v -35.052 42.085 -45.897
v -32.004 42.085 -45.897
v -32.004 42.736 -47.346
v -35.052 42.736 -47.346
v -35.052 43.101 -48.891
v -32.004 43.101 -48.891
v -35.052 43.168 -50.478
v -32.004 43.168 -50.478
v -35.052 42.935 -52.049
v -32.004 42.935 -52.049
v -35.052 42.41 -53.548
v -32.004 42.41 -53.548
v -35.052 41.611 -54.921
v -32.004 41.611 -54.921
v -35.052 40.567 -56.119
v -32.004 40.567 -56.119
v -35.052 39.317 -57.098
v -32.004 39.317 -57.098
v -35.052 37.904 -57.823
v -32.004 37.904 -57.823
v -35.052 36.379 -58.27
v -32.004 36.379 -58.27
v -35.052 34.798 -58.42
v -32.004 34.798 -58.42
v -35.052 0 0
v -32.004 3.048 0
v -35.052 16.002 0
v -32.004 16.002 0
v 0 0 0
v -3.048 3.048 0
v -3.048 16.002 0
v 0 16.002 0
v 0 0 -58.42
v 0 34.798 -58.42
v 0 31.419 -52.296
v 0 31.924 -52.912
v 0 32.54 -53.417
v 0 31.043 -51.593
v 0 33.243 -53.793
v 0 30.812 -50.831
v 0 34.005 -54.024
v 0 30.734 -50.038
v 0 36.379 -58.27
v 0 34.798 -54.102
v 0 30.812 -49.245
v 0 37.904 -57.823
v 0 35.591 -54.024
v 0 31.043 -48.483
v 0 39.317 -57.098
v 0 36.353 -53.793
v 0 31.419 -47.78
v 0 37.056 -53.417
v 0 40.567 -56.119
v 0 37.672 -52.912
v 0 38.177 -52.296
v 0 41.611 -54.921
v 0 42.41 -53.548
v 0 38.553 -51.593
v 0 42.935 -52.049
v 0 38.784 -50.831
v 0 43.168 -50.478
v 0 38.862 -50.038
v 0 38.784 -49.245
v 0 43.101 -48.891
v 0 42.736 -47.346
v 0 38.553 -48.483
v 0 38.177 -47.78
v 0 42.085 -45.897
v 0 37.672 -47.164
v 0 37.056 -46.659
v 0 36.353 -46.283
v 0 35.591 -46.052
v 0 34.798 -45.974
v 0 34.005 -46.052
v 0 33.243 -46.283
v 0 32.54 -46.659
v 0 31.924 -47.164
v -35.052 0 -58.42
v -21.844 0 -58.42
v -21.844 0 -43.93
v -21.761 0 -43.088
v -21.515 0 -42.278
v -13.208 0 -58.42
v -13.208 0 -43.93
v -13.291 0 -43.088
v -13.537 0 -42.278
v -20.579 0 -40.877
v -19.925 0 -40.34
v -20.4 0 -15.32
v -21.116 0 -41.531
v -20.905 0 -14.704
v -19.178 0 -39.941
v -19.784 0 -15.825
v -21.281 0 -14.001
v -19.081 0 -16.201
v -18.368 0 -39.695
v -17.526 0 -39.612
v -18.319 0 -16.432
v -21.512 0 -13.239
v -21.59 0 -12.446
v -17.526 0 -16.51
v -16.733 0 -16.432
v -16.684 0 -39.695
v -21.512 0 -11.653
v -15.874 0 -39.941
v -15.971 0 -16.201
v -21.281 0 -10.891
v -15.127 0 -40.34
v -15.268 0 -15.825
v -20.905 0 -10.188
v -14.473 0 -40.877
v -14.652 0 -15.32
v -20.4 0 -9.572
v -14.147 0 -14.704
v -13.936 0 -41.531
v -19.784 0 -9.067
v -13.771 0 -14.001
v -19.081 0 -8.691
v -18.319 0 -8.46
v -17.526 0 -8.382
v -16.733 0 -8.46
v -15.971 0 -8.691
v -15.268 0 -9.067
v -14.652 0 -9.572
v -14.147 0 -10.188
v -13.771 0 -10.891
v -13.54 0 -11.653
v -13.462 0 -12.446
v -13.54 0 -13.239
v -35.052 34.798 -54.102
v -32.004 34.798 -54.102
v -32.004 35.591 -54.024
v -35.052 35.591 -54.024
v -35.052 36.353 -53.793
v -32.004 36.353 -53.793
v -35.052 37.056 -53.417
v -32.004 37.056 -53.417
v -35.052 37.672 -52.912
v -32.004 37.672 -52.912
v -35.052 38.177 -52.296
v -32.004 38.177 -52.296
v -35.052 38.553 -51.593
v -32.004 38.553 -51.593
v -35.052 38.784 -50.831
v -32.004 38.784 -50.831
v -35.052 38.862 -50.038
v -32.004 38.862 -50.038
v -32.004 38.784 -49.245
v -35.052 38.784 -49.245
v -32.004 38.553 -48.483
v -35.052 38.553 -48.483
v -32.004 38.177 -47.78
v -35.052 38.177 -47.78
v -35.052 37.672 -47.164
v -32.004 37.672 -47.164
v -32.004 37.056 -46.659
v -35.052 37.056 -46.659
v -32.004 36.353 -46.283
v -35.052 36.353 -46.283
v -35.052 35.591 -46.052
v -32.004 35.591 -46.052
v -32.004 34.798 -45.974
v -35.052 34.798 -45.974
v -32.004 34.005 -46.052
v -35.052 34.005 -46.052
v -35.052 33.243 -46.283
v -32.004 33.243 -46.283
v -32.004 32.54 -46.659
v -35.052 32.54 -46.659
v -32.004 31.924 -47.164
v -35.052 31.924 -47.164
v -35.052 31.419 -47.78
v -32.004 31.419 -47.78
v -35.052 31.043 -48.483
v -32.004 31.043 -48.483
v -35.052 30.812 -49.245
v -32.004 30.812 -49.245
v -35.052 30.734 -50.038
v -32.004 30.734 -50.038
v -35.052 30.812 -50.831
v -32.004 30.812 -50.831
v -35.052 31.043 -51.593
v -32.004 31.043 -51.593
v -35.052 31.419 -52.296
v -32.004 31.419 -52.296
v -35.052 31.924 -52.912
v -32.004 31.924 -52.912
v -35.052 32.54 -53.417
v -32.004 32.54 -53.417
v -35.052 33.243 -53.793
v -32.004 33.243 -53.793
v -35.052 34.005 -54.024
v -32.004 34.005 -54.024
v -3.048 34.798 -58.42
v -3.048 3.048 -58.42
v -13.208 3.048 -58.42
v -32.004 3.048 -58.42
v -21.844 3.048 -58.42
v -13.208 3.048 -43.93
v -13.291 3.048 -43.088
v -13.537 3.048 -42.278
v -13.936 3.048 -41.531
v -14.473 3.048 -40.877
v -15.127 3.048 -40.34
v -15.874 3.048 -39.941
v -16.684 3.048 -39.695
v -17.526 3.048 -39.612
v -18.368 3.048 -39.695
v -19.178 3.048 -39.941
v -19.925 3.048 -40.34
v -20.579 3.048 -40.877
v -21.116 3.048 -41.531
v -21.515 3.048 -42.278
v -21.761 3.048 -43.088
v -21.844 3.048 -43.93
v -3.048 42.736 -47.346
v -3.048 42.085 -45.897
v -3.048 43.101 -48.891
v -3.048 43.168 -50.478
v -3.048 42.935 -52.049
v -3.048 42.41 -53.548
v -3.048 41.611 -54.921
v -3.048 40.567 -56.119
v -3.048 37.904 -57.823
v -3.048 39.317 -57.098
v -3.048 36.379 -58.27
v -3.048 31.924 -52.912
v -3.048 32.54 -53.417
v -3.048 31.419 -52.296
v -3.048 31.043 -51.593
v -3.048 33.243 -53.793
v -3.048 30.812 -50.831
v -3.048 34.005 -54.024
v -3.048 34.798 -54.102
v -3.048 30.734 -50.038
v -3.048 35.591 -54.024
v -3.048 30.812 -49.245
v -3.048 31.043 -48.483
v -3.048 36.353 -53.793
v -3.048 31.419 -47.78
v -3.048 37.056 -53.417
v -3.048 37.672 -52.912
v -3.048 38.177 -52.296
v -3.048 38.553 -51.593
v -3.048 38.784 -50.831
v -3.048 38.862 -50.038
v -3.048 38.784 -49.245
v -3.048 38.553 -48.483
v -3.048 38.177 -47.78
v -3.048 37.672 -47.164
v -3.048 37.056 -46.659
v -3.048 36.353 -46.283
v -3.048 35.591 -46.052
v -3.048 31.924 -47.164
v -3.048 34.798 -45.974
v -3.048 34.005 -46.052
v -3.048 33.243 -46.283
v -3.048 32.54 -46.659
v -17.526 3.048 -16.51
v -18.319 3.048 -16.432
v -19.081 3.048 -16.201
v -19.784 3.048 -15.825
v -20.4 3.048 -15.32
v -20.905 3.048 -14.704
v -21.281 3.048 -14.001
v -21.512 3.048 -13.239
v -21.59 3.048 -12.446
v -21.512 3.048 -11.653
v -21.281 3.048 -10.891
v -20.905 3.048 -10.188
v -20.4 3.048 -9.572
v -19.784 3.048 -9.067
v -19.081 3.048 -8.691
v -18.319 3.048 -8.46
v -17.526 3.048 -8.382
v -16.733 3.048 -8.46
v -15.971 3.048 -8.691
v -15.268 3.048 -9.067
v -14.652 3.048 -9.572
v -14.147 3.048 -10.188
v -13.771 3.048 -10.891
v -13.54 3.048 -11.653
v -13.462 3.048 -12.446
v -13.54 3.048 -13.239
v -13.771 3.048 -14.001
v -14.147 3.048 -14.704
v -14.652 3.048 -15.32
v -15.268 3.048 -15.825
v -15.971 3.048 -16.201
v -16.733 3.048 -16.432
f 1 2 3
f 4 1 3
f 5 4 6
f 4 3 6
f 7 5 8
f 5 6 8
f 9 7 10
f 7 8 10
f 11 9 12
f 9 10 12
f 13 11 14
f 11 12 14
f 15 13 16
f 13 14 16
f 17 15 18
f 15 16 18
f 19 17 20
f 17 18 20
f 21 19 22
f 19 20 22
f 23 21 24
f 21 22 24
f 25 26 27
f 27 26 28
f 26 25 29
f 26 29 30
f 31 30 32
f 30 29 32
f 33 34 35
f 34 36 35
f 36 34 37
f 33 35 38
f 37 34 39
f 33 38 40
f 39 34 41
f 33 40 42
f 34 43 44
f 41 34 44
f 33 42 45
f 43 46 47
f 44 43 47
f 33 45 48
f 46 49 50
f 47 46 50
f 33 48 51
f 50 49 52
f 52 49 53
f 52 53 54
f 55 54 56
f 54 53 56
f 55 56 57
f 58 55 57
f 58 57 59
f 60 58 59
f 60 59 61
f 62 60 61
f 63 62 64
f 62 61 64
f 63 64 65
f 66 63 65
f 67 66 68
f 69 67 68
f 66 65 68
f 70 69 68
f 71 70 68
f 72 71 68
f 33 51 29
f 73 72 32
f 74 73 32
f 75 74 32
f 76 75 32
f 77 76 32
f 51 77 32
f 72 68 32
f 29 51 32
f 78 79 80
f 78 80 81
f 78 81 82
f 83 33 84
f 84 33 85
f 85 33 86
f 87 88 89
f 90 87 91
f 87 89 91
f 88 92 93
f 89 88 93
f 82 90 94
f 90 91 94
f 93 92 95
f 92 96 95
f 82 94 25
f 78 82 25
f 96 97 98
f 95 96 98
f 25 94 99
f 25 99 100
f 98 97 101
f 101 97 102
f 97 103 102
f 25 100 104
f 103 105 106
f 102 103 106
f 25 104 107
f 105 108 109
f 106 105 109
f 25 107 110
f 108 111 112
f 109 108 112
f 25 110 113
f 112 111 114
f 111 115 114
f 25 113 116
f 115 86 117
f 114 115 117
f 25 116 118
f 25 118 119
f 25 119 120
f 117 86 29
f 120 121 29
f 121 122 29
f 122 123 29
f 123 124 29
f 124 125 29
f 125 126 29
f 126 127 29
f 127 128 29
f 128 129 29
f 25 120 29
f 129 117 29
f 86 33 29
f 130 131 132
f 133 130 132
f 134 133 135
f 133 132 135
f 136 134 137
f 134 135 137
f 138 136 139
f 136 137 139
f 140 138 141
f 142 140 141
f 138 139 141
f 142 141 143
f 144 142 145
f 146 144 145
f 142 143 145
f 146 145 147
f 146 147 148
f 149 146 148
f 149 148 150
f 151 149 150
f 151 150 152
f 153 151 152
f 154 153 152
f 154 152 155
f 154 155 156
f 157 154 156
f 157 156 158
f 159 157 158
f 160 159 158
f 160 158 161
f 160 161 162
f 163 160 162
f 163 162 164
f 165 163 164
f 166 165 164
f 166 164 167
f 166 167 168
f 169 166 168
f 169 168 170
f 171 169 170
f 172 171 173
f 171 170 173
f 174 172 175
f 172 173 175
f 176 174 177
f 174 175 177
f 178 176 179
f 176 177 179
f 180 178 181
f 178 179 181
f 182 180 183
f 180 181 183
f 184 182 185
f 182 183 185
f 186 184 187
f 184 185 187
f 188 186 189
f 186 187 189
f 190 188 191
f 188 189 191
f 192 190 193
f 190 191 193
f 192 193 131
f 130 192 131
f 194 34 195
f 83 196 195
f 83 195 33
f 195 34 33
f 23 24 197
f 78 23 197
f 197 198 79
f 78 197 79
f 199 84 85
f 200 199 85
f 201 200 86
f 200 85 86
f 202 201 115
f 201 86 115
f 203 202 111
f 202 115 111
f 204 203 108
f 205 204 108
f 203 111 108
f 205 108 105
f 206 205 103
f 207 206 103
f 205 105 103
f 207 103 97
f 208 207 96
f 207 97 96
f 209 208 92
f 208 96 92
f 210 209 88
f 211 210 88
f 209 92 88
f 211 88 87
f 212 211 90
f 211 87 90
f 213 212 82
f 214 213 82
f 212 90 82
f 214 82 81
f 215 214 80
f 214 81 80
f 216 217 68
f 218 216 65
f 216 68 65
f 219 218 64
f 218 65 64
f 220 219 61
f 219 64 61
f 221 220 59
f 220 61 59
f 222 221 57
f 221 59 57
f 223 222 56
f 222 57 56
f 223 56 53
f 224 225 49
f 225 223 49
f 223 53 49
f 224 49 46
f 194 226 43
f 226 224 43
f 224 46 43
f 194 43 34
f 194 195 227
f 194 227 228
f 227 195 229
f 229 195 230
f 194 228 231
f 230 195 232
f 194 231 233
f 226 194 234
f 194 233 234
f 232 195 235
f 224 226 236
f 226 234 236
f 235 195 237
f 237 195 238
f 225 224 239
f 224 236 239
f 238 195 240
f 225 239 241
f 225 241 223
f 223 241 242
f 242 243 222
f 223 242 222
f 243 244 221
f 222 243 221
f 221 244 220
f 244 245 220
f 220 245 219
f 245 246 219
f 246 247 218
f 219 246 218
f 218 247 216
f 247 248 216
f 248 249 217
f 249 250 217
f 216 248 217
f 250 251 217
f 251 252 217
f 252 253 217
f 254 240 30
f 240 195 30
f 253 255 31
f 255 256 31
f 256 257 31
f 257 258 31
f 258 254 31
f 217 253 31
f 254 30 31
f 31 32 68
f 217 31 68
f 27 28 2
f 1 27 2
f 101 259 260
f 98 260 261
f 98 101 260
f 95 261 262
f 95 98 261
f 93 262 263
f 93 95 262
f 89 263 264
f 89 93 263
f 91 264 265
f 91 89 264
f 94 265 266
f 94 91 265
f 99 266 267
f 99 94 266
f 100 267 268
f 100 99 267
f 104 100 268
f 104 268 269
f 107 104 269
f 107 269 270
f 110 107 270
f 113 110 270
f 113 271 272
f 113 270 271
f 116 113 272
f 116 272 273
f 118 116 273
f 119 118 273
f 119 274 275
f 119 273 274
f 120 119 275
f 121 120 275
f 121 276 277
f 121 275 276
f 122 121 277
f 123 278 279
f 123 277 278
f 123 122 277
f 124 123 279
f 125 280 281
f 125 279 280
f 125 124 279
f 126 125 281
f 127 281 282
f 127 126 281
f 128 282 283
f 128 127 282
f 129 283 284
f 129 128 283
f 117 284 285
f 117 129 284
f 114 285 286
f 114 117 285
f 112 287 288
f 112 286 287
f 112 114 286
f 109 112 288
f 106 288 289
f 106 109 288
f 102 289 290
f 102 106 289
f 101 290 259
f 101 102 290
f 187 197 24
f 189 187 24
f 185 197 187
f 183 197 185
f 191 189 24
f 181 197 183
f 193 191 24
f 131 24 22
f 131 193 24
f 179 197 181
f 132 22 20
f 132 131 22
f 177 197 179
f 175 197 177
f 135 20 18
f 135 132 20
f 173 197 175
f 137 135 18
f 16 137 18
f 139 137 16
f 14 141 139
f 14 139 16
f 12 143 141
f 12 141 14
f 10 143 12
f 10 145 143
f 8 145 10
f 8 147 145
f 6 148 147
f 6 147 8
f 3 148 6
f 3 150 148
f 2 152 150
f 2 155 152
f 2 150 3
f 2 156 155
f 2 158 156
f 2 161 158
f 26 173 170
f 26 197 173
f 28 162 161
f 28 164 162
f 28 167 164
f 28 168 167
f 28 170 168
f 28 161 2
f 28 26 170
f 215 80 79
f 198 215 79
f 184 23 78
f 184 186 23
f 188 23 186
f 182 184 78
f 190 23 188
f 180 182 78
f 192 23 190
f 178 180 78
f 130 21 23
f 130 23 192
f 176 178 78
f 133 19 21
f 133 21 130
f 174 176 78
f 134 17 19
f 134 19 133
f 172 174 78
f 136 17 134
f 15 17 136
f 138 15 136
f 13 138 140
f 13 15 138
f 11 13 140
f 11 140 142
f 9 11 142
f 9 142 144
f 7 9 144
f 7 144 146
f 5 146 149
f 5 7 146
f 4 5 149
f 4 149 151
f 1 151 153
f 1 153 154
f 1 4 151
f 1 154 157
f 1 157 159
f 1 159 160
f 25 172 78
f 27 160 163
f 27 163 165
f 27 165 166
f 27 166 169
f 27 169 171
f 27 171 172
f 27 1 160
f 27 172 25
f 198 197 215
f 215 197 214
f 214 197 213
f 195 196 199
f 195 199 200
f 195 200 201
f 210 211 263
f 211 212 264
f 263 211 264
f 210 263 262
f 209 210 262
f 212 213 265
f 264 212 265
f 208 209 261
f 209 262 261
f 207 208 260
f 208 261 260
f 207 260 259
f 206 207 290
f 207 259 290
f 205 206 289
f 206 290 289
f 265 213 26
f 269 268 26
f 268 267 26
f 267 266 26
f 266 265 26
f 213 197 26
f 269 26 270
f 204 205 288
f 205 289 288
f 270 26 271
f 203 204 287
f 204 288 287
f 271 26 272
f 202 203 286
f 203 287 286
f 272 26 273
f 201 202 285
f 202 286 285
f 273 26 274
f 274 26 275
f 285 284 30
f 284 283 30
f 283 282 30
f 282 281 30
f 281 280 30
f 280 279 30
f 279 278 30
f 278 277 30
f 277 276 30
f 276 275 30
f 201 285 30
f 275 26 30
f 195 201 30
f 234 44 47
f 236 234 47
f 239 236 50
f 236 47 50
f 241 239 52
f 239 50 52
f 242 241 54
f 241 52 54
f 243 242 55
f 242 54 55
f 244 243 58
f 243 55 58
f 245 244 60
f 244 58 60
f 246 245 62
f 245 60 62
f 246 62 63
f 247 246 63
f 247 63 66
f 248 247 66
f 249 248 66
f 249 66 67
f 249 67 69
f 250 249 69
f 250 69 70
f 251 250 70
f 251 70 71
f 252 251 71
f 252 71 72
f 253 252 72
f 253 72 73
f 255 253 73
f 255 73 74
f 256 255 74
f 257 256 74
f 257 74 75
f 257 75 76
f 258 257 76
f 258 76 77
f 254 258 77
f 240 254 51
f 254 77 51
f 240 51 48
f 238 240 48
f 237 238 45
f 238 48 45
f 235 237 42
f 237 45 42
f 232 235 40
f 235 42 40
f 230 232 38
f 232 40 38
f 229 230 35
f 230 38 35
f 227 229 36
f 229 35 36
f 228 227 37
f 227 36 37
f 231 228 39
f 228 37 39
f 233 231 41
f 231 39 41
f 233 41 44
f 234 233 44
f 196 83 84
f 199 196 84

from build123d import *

# Parameters (mm, degrees)
SKETCH1_R               = 4.064
BOSS_EXTRUDE1_DEPTH     = 35.052
SKETCH2_W               = 28.956
SKETCH2_H               = 40.132
CUT_EXTRUDE1_DEPTH      = 59.42
SKETCH3_R               = 4.064
CUT_EXTRUDE3_DEPTH      = 44.18
CUT_EXTRUDE3_DEPTH_BACK = 35.052


with BuildPart() as part:
    # Sketch1 → Boss-Extrude1 (new body)
    with BuildSketch(Plane(origin=(0, 0, 0), x_dir=(0, 0, -1), z_dir=(1, 0, 0))):
        with BuildLine():
            Line((0, 16.002), (45.896514256, 42.085387724))
            ThreePointArc((45.896514256, 42.085387724), (54.253684434, 42.0427173), (58.42, 34.798))
            Line((58.42, 34.798), (58.42, 0))
            Line((58.42, 0), (0, 0))
            Line((0, 0), (0, 16.002))
        make_face()
        with Locations((50.038, 34.798)):
            Circle(SKETCH1_R, mode=Mode.SUBTRACT)
    extrude(amount=-BOSS_EXTRUDE1_DEPTH)

    # Sketch2 → Cut-Extrude1 (cut, through all)
    with BuildSketch(Plane.XY):
        with Locations((-17.526, 23.114)):
            Rectangle(SKETCH2_W, SKETCH2_H)
    extrude(amount=-CUT_EXTRUDE1_DEPTH, mode=Mode.SUBTRACT)

    # Sketch3 → Cut-Extrude3 (cut, two sides)
    with BuildSketch(Plane(origin=(0, 0, 0), x_dir=(1, 0, 0), z_dir=(0, 1, 0))) as cut_extrude3_sk:
        with Locations(Location((-17.526, 12.446, 0), (0, 0, 90))):  # turned: the seam where the file's is
            Circle(SKETCH3_R)
        with BuildLine():
            Line((-21.844, 43.930247399), (-21.844, 58.42))
            Line((-21.844, 58.42), (-13.208, 58.42))
            Line((-13.208, 58.42), (-13.208, 43.930247399))
            ThreePointArc((-13.208, 43.930247399), (-17.526, 39.612247399), (-21.844, 43.930247399))
        make_face()
    extrude(amount=CUT_EXTRUDE3_DEPTH, mode=Mode.SUBTRACT)
    extrude(cut_extrude3_sk.sketch, amount=-CUT_EXTRUDE3_DEPTH_BACK, mode=Mode.SUBTRACT)


solid = part.part
